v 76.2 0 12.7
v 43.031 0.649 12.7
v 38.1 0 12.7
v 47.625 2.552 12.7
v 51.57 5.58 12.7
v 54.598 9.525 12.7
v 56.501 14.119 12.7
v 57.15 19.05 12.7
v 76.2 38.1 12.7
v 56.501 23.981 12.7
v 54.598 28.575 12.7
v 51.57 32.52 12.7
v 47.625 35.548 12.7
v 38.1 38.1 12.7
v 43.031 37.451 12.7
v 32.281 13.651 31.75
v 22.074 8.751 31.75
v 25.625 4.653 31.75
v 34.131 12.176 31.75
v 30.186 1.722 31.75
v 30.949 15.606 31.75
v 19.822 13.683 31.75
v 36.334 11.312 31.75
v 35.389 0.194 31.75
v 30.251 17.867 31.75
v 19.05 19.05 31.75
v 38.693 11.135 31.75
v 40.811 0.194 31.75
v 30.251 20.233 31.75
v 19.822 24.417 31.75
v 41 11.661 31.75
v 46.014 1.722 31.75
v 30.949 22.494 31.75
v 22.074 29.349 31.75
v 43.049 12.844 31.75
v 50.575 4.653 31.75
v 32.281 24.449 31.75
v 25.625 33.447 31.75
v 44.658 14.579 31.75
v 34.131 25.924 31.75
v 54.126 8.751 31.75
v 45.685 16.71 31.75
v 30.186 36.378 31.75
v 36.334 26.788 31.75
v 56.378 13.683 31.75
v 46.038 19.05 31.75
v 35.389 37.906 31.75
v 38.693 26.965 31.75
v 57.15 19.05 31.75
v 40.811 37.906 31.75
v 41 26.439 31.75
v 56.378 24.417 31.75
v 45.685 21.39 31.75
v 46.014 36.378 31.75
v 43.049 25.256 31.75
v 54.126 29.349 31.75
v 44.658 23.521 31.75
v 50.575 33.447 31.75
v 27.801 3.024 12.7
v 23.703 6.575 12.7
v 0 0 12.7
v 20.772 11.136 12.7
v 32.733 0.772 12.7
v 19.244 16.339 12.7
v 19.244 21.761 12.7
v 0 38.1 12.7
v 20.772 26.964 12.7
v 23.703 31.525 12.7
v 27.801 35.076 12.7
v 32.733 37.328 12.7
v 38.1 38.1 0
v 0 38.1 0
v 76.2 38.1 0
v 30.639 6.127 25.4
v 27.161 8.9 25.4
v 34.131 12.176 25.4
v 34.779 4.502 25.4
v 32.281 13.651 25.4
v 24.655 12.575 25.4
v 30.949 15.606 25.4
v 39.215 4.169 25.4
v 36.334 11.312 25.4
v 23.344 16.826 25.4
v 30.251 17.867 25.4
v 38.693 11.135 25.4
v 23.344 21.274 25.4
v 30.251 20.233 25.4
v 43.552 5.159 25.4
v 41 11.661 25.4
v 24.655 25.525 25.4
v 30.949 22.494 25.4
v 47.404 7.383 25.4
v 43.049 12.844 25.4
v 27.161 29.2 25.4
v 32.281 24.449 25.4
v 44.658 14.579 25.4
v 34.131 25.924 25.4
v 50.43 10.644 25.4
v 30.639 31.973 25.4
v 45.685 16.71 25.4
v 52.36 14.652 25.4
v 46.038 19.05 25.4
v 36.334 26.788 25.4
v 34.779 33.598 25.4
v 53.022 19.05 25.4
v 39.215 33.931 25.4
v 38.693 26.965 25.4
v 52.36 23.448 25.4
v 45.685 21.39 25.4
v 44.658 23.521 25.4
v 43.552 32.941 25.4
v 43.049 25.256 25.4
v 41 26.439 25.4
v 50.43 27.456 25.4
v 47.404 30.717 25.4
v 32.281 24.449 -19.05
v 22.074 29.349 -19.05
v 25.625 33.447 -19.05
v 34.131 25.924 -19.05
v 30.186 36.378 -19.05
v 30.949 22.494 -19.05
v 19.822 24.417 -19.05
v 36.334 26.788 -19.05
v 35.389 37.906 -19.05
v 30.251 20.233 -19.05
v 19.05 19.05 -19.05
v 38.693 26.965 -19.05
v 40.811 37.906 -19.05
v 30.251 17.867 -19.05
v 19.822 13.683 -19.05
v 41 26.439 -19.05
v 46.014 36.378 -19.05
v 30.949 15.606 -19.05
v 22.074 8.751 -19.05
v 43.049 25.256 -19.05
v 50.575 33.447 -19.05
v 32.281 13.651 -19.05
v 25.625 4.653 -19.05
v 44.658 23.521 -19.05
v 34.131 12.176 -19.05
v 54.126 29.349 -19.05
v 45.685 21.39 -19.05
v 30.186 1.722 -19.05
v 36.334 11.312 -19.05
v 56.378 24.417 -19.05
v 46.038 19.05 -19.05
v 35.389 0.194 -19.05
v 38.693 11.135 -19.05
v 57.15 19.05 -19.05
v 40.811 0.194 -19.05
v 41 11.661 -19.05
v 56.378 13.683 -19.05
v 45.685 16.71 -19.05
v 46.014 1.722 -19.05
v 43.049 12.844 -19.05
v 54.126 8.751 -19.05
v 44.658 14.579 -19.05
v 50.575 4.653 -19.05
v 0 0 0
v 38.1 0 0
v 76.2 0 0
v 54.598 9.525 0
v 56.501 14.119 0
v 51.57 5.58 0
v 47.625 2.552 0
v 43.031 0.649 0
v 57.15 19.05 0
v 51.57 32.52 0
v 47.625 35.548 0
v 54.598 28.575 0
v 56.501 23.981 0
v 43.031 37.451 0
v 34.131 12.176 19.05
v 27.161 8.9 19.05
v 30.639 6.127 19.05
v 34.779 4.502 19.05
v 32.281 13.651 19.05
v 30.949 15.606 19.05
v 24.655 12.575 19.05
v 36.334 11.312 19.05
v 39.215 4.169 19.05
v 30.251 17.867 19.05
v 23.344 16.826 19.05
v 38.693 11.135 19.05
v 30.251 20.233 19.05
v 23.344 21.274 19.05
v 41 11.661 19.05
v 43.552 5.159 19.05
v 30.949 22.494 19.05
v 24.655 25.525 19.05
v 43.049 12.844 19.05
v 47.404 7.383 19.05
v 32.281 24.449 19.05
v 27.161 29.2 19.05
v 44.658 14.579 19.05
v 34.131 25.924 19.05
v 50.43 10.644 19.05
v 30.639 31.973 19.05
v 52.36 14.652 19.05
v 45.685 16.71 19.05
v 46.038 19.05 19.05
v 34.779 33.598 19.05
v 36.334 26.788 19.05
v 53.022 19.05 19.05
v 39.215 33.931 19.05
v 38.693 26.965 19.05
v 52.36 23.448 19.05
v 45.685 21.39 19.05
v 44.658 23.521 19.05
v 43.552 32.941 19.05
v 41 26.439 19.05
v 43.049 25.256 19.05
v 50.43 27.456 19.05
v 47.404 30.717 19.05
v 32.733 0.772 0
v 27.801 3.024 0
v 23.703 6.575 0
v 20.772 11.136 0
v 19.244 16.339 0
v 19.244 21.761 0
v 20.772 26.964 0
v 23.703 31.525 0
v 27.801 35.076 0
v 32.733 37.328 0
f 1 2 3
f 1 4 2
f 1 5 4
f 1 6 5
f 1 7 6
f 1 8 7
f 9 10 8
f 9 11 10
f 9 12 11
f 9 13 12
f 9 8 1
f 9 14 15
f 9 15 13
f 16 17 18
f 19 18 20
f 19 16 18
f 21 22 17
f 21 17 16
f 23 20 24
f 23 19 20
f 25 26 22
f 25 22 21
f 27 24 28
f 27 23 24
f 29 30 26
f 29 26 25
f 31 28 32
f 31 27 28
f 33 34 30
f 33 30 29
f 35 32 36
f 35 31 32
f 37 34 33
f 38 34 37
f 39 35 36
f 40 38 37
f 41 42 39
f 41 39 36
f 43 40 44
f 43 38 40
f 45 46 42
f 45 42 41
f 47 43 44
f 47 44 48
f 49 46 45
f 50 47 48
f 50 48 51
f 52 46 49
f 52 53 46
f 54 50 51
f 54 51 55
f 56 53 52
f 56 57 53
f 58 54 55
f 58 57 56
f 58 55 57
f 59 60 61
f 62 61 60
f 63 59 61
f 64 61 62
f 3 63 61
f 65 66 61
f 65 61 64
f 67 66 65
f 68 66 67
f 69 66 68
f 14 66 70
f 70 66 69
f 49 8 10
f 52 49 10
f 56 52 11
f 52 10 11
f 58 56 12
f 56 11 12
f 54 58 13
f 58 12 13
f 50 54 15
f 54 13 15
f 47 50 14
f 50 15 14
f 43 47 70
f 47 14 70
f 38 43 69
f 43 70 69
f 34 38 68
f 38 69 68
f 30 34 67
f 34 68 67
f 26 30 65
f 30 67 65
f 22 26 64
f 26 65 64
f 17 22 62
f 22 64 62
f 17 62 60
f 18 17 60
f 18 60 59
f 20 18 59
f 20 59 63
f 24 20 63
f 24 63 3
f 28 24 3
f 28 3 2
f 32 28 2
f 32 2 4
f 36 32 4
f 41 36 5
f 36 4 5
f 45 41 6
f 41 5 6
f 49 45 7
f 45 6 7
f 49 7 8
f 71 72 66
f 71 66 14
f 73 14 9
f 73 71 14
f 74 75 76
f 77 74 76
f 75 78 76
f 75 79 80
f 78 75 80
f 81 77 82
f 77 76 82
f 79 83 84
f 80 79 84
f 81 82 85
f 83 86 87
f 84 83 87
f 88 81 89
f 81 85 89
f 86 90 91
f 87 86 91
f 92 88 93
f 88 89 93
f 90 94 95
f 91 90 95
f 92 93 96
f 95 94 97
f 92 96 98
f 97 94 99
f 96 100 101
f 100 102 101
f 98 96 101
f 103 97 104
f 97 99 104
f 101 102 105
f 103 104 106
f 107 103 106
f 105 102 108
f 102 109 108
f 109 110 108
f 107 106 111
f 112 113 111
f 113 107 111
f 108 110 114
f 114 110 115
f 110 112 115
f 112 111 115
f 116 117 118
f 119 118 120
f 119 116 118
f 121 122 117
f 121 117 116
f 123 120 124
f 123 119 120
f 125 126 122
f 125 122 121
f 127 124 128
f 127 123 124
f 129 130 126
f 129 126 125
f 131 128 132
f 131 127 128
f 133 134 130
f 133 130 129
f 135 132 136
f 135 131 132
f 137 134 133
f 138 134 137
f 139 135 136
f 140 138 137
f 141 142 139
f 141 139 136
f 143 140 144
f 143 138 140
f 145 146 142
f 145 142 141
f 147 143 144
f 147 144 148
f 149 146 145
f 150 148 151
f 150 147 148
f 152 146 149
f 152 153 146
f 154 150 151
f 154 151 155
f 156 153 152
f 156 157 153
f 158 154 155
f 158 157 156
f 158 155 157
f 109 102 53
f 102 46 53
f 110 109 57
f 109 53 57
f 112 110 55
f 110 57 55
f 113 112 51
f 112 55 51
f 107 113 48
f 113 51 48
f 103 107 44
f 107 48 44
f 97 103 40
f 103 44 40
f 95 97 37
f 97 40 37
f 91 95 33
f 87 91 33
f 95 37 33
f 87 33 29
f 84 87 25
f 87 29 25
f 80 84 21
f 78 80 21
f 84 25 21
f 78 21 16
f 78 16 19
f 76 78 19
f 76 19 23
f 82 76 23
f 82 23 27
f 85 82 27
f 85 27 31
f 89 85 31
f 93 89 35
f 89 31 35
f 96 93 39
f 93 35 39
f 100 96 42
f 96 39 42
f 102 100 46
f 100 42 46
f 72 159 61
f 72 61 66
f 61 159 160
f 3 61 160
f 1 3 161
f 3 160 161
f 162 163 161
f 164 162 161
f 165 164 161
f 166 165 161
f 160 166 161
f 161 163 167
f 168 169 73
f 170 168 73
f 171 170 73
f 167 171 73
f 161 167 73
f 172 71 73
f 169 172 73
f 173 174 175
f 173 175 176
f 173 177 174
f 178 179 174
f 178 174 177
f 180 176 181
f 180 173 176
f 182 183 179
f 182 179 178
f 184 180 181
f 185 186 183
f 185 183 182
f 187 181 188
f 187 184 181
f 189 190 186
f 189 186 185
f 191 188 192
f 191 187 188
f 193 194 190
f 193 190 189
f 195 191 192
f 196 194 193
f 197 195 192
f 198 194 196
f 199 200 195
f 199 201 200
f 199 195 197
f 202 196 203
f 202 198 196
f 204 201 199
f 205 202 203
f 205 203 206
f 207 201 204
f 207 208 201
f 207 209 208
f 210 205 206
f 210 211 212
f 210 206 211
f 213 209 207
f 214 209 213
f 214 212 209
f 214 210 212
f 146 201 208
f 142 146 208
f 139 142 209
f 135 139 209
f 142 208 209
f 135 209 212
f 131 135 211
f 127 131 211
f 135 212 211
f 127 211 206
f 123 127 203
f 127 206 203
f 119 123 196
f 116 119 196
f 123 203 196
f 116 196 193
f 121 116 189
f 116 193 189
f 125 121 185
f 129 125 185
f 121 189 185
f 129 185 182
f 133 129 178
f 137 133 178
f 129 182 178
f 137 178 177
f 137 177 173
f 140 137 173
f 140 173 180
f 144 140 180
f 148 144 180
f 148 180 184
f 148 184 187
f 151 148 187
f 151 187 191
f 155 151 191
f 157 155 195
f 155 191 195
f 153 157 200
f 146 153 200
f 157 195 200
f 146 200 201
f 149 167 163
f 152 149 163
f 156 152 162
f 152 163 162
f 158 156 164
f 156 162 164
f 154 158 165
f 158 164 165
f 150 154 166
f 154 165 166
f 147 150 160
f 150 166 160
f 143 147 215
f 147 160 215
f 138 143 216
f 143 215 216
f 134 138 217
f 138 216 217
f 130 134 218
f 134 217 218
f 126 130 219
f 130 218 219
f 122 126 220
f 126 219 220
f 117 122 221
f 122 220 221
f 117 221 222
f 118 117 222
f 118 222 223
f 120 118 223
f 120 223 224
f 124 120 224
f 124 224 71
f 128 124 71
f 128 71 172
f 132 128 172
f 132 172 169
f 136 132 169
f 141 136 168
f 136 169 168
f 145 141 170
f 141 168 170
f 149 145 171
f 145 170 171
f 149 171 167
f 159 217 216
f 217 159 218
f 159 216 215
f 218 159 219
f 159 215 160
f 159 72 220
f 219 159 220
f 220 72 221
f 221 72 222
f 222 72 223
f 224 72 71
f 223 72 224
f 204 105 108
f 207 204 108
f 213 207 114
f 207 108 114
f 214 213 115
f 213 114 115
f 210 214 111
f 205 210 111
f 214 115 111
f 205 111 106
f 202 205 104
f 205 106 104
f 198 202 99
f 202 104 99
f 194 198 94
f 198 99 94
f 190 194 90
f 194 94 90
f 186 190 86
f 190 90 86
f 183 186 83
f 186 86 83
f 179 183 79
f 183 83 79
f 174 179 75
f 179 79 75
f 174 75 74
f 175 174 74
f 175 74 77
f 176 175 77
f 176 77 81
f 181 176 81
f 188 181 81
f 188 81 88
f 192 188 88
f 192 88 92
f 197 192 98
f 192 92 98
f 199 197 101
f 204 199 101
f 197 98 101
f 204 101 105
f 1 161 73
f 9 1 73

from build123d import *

# Parameters (mm, degrees)
F0_W          = 76.2
F0_H          = 38.1
F1_DEPTH      = 12.7
F2_R          = 19.05
F3_DEPTH      = 19.05
F4_R          = 19.05
F5_DEPTH      = 19.05
F6_R          = 7.9375
F7_DEPTH      = 19.051
F7_DEPTH_BACK = 31.751
F9_START      = -6.35
F8_R          = 14.9225
F8_R_2        = 7.9375
F9_DEPTH      = 6.35


with BuildPart() as f1:
    # F0 (on Top) → F1 (new body)
    with BuildSketch(Plane.XY):
        with Locations((38.1, 19.05)):
            Rectangle(F0_W, F0_H)
    extrude(amount=F1_DEPTH)

    # F2 (on face) → F3 (join)
    with BuildSketch(Plane.XY.offset(12.7)):
        with Locations((38.1, 19.05)):
            Circle(F2_R)
    extrude(amount=F3_DEPTH)

    # F4 (on face) → F5 (join)
    with BuildSketch(Plane(origin=(0, 0, 0), x_dir=(1, 0, 0), z_dir=(0, 0, -1))):
        with Locations((38.1, -19.05)):
            Circle(F4_R)
    extrude(amount=F5_DEPTH)

    # F6 (on Top) → F7 (cut, two sides)
    with BuildSketch(Plane.XY) as f7_sk:
        with Locations((38.1, 19.05)):
            Circle(F6_R)
    extrude(amount=-F7_DEPTH, mode=Mode.SUBTRACT)
    extrude(f7_sk.sketch, amount=F7_DEPTH_BACK, mode=Mode.SUBTRACT)

    # F8 (on face) → F9 (cut)
    with BuildSketch(Plane.XY.offset(31.75).offset(F9_START)):
        with Locations((38.1, 19.05)):
            Circle(F8_R)
        with Locations((38.1, 19.05)):
            Circle(F8_R_2, mode=Mode.SUBTRACT)
    extrude(amount=-F9_DEPTH, mode=Mode.SUBTRACT)


solid = f1.part
